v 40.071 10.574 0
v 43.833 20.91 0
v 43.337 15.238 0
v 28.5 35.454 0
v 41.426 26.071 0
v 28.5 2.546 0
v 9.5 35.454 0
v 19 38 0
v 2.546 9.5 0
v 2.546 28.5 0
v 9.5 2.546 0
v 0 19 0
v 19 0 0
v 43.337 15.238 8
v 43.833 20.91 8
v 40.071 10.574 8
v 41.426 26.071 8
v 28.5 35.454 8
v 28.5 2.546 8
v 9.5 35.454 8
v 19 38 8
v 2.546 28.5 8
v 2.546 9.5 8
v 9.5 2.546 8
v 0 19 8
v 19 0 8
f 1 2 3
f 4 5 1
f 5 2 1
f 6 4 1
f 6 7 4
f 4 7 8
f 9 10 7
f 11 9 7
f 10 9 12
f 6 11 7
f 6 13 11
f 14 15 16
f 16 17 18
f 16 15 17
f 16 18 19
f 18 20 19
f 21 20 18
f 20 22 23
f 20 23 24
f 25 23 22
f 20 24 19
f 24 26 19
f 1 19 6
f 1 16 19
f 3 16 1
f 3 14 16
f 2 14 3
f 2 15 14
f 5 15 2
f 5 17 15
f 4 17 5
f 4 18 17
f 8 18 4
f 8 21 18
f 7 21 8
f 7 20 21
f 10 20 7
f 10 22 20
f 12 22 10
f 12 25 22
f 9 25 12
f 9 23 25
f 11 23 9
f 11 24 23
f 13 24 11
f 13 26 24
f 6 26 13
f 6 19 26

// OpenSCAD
$fn = 32;

// ----------------------------------------------------------------------
// Eccentric disc: step, 8 mm thick
// ----------------------------------------------------------------------

// --- parameters (mm) ---
profile_height = 8;       // extrusion height
profile_points = 13;      // points of the closed outline

profile = [[0, 19], [2.546, 9.5], [9.5, 2.546], [19, 0], [28.5, 2.546], [40.071, 10.574], [43.337, 15.238], [43.833, 20.91], [41.426, 26.071], [28.5, 35.454], [19, 38], [9.5, 35.454], [2.546, 28.5]];  // single closed polygon, 13 points, counter clockwise

// --- the one profile operation ---
linear_extrude(height = profile_height) polygon(points = profile);
